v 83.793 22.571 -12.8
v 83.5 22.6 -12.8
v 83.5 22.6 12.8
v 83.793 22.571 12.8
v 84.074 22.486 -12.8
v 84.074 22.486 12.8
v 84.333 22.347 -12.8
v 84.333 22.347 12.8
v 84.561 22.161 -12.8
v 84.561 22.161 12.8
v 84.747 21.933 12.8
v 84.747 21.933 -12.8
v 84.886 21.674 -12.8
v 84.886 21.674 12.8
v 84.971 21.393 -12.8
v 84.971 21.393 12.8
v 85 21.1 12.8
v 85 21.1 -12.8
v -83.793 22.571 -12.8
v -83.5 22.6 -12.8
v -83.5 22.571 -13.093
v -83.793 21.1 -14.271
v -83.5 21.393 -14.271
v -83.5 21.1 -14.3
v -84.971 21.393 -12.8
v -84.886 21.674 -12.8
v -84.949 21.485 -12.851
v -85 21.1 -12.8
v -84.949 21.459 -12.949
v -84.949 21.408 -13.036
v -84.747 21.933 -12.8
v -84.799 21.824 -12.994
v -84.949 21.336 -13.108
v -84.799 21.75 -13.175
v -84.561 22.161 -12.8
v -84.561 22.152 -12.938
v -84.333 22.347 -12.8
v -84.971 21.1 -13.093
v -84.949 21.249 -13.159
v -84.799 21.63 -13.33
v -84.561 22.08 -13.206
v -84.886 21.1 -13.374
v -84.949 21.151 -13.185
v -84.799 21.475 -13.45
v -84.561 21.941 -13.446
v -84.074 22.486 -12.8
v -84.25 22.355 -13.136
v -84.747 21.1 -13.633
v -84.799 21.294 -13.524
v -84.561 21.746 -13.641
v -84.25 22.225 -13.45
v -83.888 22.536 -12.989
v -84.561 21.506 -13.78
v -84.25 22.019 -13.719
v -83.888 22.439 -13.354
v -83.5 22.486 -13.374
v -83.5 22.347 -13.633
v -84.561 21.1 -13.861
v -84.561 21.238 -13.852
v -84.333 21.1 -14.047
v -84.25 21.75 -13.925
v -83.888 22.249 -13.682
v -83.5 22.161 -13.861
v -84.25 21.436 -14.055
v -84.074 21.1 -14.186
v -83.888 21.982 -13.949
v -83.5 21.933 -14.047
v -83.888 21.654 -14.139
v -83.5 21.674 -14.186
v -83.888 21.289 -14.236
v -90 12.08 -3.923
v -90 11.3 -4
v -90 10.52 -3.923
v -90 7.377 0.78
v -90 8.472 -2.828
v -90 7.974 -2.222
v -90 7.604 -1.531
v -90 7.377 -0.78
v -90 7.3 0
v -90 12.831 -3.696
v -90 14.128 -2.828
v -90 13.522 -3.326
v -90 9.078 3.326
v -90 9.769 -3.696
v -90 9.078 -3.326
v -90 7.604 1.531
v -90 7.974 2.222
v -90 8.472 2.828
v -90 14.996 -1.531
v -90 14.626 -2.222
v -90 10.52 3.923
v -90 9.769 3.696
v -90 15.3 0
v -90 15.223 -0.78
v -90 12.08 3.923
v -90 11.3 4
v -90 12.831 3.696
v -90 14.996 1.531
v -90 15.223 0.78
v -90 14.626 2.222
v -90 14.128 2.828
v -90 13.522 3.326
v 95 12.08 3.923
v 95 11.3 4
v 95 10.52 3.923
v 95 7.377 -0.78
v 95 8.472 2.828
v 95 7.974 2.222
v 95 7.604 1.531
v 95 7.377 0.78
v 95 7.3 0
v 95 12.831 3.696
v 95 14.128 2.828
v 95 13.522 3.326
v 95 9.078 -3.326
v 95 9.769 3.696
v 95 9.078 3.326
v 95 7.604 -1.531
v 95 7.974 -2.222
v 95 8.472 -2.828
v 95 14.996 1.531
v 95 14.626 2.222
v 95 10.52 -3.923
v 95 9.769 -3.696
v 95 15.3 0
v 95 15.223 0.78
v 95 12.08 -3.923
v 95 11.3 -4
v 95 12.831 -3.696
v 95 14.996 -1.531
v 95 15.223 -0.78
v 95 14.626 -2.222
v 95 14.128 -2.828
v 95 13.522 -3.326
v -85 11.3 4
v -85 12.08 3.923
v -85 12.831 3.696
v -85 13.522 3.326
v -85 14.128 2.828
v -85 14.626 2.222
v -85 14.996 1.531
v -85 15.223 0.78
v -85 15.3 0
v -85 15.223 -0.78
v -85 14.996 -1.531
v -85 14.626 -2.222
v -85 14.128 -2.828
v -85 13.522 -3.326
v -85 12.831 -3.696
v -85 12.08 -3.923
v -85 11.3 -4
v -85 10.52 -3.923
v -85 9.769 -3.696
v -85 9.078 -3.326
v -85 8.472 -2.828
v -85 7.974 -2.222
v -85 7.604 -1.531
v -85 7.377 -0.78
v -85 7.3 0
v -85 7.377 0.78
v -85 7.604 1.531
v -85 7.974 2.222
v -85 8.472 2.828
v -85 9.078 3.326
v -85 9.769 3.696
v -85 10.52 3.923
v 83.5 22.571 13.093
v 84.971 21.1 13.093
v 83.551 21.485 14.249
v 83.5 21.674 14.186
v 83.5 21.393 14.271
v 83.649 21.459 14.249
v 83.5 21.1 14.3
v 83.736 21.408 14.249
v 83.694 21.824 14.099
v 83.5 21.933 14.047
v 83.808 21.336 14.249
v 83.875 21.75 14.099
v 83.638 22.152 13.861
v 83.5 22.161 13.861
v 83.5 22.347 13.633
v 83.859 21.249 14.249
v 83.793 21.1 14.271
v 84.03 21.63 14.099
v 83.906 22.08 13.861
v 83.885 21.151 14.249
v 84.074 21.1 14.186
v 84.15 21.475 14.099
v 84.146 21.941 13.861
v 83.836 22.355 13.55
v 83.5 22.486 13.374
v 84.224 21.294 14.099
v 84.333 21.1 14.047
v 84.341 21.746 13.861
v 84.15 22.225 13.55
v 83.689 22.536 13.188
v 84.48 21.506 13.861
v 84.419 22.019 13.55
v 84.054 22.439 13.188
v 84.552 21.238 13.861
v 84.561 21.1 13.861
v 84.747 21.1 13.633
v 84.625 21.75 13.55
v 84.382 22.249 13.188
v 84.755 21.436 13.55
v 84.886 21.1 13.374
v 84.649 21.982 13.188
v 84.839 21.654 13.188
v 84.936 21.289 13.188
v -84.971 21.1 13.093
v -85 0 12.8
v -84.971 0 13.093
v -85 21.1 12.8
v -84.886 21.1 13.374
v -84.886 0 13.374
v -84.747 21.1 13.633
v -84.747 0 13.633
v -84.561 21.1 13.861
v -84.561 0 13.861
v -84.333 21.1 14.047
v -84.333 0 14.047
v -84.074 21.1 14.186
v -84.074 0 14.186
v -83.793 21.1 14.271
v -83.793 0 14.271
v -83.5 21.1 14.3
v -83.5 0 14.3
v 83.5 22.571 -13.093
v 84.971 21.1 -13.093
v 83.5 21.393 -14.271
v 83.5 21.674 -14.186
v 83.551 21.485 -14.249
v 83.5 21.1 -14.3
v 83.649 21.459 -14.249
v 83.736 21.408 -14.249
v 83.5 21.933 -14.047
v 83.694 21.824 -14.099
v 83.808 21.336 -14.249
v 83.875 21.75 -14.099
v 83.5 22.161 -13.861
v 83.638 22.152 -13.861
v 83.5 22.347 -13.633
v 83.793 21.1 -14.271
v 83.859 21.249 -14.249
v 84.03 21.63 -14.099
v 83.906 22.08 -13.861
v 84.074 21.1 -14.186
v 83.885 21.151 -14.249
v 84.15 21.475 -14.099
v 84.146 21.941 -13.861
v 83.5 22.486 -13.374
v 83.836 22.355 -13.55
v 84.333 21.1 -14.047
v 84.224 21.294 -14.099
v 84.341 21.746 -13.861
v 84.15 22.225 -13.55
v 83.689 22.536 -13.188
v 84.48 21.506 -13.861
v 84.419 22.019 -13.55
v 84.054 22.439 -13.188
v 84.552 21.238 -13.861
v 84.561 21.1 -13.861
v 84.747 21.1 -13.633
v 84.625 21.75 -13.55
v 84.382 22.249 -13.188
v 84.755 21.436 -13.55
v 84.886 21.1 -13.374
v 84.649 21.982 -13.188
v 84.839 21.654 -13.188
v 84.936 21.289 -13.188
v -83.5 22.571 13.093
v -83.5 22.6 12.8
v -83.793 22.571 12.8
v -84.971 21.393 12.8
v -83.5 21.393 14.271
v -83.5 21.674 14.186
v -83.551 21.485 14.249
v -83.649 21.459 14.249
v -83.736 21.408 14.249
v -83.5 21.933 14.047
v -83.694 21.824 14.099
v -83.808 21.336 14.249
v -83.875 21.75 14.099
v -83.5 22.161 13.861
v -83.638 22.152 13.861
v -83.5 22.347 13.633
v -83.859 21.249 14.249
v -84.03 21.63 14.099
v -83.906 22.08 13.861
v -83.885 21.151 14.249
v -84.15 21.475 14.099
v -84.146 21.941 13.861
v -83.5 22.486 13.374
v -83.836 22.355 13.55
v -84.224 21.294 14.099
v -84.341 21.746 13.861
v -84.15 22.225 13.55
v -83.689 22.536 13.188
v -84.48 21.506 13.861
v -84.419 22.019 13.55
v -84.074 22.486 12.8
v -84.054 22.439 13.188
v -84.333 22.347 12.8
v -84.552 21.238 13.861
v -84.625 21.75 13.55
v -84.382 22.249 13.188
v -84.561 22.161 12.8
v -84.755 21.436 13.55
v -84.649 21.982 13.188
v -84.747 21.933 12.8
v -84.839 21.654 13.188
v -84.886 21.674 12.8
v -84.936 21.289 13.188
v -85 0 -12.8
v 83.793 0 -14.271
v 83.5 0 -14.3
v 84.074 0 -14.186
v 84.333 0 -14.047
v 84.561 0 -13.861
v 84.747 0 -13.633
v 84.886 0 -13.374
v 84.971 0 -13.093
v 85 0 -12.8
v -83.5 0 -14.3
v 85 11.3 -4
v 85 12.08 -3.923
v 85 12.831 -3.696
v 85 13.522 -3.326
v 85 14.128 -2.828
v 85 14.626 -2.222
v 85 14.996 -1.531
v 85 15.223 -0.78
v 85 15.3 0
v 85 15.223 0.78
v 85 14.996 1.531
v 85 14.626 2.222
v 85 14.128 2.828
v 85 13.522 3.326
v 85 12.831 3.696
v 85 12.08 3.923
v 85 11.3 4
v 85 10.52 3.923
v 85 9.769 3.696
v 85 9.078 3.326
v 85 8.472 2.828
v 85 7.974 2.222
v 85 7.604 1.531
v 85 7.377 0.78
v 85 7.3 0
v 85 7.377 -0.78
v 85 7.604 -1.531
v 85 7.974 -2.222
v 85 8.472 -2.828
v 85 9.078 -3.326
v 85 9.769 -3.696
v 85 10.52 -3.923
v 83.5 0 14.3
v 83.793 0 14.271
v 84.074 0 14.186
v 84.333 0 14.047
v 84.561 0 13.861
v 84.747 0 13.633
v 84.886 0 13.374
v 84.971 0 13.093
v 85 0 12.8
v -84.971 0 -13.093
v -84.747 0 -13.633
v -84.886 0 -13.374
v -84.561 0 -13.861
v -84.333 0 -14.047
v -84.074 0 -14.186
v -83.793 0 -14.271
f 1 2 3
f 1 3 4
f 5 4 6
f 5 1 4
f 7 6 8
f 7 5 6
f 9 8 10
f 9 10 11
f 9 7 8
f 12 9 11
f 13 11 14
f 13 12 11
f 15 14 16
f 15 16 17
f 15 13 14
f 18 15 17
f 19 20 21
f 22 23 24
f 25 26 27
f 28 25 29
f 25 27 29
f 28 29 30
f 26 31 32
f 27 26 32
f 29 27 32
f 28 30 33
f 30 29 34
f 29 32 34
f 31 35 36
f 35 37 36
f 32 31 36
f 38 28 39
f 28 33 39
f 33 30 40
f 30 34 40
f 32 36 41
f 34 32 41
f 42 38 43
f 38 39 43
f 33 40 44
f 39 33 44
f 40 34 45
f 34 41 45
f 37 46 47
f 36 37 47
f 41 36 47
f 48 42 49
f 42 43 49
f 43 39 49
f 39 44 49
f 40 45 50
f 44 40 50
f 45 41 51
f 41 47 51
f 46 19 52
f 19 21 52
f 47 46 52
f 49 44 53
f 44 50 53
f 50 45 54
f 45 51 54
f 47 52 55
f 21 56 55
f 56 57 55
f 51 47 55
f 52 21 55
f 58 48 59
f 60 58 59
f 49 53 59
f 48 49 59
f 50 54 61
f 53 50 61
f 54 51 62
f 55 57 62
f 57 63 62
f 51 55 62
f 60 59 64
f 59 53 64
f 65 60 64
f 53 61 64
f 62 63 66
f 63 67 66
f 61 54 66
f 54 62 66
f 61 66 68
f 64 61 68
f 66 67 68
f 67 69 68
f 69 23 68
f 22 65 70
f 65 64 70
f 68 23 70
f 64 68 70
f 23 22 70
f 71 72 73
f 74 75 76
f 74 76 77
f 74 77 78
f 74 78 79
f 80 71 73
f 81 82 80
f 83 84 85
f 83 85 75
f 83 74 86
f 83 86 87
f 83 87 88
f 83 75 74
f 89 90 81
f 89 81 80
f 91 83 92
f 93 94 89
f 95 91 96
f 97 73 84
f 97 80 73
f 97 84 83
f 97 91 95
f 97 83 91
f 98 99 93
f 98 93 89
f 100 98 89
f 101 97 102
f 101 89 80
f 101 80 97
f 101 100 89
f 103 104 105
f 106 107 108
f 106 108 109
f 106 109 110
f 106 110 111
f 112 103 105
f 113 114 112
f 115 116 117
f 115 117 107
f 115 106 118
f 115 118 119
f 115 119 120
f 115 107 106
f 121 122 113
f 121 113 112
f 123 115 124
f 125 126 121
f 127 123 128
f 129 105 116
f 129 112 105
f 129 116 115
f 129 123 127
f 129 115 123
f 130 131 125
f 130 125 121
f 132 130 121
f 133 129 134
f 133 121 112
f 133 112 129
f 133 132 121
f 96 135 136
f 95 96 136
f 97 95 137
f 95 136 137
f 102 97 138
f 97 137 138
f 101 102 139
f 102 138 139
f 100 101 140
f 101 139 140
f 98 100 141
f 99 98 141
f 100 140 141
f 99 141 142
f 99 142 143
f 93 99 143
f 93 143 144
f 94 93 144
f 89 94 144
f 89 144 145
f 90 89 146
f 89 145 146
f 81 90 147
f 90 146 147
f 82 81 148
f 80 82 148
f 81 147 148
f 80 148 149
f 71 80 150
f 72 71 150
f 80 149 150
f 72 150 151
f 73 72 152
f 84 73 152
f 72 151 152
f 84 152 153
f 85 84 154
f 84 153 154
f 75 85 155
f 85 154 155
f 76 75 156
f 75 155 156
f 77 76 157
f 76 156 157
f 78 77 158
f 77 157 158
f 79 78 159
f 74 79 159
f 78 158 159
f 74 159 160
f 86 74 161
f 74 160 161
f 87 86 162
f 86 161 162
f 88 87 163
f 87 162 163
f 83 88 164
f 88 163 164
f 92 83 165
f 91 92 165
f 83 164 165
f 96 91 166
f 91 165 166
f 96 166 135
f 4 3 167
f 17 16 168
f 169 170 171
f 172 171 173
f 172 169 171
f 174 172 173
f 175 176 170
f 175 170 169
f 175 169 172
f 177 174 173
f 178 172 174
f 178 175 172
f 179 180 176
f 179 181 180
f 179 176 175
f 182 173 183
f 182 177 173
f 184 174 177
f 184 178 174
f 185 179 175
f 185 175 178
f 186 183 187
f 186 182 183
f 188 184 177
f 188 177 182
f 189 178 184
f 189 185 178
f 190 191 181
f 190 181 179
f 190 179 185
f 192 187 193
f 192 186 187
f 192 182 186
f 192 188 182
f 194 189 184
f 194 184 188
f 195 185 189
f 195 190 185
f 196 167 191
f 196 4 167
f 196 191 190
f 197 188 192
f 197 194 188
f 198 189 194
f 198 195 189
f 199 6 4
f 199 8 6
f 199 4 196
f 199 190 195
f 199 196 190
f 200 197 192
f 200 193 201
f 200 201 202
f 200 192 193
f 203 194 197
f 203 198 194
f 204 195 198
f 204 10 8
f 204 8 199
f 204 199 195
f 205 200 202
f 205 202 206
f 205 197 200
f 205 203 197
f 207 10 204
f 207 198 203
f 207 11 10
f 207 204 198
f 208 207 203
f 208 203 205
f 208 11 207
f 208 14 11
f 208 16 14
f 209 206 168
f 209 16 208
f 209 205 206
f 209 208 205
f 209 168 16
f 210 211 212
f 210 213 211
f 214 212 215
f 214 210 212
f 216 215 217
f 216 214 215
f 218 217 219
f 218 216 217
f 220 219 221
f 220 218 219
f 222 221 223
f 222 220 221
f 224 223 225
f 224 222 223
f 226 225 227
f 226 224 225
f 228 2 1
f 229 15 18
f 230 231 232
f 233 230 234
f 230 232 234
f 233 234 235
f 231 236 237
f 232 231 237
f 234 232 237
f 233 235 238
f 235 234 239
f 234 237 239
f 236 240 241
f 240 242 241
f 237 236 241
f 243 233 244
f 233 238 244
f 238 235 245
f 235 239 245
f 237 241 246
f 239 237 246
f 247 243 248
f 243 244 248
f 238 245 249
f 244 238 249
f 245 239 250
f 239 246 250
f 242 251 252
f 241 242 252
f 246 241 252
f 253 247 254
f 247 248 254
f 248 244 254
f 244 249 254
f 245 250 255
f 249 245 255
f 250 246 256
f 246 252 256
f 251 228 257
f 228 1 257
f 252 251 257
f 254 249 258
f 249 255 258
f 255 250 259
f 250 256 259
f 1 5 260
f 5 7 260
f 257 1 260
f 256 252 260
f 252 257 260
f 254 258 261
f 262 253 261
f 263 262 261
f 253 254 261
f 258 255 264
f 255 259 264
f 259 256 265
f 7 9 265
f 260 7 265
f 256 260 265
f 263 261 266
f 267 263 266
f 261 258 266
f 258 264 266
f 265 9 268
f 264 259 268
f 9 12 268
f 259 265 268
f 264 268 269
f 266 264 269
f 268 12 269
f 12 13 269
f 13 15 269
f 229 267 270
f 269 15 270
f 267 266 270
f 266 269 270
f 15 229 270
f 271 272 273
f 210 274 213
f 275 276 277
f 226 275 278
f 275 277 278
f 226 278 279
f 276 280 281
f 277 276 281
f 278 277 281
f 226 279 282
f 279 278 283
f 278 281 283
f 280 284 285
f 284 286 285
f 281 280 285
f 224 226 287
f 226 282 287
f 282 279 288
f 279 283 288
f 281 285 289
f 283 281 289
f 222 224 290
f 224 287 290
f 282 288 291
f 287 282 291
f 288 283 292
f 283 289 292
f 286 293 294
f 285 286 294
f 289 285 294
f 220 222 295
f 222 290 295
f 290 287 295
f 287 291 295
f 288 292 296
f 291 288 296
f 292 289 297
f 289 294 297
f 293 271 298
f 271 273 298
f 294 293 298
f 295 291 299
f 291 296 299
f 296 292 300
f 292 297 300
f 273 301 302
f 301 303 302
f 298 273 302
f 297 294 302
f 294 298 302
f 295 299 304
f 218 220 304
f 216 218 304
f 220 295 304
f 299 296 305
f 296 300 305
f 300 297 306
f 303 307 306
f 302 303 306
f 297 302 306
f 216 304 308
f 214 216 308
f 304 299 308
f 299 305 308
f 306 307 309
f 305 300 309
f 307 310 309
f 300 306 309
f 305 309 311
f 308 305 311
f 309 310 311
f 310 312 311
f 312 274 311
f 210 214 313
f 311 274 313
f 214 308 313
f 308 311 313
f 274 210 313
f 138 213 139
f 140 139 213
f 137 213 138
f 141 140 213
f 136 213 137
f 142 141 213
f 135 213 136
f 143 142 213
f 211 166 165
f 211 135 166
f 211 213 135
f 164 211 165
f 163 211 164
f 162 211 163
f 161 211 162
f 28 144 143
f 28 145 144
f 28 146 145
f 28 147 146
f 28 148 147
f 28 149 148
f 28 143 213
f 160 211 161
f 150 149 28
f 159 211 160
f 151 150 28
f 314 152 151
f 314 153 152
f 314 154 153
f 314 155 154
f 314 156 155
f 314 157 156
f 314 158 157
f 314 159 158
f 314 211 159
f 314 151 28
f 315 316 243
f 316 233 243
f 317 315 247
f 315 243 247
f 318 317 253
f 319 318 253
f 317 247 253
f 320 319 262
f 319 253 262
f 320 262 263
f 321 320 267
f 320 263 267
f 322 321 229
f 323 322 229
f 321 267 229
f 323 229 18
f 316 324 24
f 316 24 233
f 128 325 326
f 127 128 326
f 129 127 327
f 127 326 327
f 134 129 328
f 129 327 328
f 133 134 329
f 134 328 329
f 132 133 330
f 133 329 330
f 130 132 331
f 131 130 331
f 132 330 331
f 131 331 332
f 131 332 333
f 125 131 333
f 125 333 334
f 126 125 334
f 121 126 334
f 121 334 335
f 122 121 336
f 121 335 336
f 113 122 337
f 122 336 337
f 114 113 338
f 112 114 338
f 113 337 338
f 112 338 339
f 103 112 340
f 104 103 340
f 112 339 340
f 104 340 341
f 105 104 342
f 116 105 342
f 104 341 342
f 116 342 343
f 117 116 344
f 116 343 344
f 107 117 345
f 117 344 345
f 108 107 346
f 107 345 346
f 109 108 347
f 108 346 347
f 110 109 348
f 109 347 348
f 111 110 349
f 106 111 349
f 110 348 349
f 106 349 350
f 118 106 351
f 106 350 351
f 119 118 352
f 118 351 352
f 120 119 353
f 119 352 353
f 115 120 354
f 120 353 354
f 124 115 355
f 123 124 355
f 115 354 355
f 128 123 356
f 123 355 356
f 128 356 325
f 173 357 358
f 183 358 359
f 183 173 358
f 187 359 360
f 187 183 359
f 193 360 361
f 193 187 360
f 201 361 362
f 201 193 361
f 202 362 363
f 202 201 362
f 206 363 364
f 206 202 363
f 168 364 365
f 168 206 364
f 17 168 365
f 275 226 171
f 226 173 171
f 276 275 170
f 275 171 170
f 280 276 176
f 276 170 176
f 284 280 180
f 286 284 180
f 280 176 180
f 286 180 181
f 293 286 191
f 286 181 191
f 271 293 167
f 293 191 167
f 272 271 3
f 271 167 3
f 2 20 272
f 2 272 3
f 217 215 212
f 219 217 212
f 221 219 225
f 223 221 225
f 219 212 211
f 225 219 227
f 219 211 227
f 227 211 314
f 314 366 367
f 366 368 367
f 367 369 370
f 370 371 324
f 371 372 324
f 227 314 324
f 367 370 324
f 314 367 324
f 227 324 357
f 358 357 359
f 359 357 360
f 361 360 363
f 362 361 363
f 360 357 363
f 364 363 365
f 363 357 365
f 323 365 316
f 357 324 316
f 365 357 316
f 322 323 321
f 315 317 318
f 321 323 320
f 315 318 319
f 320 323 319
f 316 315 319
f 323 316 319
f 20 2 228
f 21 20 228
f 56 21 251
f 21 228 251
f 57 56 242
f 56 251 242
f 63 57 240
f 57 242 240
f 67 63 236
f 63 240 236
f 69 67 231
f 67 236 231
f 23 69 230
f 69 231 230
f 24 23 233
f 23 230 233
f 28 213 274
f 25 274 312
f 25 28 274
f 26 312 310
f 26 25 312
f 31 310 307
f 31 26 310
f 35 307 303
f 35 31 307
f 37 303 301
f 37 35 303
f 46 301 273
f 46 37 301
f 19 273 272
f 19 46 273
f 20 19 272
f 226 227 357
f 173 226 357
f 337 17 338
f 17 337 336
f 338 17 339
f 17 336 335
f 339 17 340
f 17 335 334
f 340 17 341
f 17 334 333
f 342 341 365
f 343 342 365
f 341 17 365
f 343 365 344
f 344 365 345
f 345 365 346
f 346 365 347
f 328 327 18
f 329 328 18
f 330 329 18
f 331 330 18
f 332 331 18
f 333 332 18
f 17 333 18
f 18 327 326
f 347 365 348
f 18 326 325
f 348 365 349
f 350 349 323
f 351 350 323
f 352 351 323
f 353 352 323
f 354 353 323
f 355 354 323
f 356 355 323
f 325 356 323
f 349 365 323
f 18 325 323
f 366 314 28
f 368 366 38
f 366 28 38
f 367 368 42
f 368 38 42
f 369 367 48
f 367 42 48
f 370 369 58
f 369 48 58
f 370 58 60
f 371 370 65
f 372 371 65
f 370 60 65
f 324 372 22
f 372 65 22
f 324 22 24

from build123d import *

# Parameters (mm, degrees)
SKETCH1_W           = 170
SKETCH1_H           = 28.6
BOSS_EXTRUDE1_DEPTH = 22.6
SKETCH2_R           = 4
BOSS_EXTRUDE2_DEPTH = 10
SKETCH3_R           = 4
BOSS_EXTRUDE3_DEPTH = 5
FILLET1_R           = 1.5


with BuildPart() as part:
    # Sketch1 → Boss-Extrude1 (new body)
    with BuildSketch(Plane(origin=(0, 0, 0), x_dir=(1, 0, 0), z_dir=(0, 1, 0))):
        Rectangle(SKETCH1_W, SKETCH1_H)
    extrude(amount=BOSS_EXTRUDE1_DEPTH)

    # Sketch2 → Boss-Extrude2 (add)
    with BuildSketch(Plane(origin=(85, 0, 0), x_dir=(0, 0, -1), z_dir=(1, 0, 0))):
        with Locations((0, 11.3)):
            Circle(SKETCH2_R)
    extrude(amount=BOSS_EXTRUDE2_DEPTH)

    # Sketch3 → Boss-Extrude3 (add)
    with BuildSketch(Plane.ZY.offset(85)):
        with Locations((0, 11.3)):
            Circle(SKETCH3_R)
    extrude(amount=BOSS_EXTRUDE3_DEPTH)

    # Fillet1
    fillet1_edges = [part.edges().sort_by_distance(p)[0] for p in [
        (85, 22.6, 0),
        (0, 22.6, -14.3),
        (-85, 22.6, 0),
        (0, 22.6, 14.3),
        (-85, 11.3, -14.3),
        (85, 11.3, -14.3),
        (85, 11.3, 14.3),
        (-85, 11.3, 14.3),
    ]]
    fillet(fillet1_edges, radius=FILLET1_R)


solid = part.part
